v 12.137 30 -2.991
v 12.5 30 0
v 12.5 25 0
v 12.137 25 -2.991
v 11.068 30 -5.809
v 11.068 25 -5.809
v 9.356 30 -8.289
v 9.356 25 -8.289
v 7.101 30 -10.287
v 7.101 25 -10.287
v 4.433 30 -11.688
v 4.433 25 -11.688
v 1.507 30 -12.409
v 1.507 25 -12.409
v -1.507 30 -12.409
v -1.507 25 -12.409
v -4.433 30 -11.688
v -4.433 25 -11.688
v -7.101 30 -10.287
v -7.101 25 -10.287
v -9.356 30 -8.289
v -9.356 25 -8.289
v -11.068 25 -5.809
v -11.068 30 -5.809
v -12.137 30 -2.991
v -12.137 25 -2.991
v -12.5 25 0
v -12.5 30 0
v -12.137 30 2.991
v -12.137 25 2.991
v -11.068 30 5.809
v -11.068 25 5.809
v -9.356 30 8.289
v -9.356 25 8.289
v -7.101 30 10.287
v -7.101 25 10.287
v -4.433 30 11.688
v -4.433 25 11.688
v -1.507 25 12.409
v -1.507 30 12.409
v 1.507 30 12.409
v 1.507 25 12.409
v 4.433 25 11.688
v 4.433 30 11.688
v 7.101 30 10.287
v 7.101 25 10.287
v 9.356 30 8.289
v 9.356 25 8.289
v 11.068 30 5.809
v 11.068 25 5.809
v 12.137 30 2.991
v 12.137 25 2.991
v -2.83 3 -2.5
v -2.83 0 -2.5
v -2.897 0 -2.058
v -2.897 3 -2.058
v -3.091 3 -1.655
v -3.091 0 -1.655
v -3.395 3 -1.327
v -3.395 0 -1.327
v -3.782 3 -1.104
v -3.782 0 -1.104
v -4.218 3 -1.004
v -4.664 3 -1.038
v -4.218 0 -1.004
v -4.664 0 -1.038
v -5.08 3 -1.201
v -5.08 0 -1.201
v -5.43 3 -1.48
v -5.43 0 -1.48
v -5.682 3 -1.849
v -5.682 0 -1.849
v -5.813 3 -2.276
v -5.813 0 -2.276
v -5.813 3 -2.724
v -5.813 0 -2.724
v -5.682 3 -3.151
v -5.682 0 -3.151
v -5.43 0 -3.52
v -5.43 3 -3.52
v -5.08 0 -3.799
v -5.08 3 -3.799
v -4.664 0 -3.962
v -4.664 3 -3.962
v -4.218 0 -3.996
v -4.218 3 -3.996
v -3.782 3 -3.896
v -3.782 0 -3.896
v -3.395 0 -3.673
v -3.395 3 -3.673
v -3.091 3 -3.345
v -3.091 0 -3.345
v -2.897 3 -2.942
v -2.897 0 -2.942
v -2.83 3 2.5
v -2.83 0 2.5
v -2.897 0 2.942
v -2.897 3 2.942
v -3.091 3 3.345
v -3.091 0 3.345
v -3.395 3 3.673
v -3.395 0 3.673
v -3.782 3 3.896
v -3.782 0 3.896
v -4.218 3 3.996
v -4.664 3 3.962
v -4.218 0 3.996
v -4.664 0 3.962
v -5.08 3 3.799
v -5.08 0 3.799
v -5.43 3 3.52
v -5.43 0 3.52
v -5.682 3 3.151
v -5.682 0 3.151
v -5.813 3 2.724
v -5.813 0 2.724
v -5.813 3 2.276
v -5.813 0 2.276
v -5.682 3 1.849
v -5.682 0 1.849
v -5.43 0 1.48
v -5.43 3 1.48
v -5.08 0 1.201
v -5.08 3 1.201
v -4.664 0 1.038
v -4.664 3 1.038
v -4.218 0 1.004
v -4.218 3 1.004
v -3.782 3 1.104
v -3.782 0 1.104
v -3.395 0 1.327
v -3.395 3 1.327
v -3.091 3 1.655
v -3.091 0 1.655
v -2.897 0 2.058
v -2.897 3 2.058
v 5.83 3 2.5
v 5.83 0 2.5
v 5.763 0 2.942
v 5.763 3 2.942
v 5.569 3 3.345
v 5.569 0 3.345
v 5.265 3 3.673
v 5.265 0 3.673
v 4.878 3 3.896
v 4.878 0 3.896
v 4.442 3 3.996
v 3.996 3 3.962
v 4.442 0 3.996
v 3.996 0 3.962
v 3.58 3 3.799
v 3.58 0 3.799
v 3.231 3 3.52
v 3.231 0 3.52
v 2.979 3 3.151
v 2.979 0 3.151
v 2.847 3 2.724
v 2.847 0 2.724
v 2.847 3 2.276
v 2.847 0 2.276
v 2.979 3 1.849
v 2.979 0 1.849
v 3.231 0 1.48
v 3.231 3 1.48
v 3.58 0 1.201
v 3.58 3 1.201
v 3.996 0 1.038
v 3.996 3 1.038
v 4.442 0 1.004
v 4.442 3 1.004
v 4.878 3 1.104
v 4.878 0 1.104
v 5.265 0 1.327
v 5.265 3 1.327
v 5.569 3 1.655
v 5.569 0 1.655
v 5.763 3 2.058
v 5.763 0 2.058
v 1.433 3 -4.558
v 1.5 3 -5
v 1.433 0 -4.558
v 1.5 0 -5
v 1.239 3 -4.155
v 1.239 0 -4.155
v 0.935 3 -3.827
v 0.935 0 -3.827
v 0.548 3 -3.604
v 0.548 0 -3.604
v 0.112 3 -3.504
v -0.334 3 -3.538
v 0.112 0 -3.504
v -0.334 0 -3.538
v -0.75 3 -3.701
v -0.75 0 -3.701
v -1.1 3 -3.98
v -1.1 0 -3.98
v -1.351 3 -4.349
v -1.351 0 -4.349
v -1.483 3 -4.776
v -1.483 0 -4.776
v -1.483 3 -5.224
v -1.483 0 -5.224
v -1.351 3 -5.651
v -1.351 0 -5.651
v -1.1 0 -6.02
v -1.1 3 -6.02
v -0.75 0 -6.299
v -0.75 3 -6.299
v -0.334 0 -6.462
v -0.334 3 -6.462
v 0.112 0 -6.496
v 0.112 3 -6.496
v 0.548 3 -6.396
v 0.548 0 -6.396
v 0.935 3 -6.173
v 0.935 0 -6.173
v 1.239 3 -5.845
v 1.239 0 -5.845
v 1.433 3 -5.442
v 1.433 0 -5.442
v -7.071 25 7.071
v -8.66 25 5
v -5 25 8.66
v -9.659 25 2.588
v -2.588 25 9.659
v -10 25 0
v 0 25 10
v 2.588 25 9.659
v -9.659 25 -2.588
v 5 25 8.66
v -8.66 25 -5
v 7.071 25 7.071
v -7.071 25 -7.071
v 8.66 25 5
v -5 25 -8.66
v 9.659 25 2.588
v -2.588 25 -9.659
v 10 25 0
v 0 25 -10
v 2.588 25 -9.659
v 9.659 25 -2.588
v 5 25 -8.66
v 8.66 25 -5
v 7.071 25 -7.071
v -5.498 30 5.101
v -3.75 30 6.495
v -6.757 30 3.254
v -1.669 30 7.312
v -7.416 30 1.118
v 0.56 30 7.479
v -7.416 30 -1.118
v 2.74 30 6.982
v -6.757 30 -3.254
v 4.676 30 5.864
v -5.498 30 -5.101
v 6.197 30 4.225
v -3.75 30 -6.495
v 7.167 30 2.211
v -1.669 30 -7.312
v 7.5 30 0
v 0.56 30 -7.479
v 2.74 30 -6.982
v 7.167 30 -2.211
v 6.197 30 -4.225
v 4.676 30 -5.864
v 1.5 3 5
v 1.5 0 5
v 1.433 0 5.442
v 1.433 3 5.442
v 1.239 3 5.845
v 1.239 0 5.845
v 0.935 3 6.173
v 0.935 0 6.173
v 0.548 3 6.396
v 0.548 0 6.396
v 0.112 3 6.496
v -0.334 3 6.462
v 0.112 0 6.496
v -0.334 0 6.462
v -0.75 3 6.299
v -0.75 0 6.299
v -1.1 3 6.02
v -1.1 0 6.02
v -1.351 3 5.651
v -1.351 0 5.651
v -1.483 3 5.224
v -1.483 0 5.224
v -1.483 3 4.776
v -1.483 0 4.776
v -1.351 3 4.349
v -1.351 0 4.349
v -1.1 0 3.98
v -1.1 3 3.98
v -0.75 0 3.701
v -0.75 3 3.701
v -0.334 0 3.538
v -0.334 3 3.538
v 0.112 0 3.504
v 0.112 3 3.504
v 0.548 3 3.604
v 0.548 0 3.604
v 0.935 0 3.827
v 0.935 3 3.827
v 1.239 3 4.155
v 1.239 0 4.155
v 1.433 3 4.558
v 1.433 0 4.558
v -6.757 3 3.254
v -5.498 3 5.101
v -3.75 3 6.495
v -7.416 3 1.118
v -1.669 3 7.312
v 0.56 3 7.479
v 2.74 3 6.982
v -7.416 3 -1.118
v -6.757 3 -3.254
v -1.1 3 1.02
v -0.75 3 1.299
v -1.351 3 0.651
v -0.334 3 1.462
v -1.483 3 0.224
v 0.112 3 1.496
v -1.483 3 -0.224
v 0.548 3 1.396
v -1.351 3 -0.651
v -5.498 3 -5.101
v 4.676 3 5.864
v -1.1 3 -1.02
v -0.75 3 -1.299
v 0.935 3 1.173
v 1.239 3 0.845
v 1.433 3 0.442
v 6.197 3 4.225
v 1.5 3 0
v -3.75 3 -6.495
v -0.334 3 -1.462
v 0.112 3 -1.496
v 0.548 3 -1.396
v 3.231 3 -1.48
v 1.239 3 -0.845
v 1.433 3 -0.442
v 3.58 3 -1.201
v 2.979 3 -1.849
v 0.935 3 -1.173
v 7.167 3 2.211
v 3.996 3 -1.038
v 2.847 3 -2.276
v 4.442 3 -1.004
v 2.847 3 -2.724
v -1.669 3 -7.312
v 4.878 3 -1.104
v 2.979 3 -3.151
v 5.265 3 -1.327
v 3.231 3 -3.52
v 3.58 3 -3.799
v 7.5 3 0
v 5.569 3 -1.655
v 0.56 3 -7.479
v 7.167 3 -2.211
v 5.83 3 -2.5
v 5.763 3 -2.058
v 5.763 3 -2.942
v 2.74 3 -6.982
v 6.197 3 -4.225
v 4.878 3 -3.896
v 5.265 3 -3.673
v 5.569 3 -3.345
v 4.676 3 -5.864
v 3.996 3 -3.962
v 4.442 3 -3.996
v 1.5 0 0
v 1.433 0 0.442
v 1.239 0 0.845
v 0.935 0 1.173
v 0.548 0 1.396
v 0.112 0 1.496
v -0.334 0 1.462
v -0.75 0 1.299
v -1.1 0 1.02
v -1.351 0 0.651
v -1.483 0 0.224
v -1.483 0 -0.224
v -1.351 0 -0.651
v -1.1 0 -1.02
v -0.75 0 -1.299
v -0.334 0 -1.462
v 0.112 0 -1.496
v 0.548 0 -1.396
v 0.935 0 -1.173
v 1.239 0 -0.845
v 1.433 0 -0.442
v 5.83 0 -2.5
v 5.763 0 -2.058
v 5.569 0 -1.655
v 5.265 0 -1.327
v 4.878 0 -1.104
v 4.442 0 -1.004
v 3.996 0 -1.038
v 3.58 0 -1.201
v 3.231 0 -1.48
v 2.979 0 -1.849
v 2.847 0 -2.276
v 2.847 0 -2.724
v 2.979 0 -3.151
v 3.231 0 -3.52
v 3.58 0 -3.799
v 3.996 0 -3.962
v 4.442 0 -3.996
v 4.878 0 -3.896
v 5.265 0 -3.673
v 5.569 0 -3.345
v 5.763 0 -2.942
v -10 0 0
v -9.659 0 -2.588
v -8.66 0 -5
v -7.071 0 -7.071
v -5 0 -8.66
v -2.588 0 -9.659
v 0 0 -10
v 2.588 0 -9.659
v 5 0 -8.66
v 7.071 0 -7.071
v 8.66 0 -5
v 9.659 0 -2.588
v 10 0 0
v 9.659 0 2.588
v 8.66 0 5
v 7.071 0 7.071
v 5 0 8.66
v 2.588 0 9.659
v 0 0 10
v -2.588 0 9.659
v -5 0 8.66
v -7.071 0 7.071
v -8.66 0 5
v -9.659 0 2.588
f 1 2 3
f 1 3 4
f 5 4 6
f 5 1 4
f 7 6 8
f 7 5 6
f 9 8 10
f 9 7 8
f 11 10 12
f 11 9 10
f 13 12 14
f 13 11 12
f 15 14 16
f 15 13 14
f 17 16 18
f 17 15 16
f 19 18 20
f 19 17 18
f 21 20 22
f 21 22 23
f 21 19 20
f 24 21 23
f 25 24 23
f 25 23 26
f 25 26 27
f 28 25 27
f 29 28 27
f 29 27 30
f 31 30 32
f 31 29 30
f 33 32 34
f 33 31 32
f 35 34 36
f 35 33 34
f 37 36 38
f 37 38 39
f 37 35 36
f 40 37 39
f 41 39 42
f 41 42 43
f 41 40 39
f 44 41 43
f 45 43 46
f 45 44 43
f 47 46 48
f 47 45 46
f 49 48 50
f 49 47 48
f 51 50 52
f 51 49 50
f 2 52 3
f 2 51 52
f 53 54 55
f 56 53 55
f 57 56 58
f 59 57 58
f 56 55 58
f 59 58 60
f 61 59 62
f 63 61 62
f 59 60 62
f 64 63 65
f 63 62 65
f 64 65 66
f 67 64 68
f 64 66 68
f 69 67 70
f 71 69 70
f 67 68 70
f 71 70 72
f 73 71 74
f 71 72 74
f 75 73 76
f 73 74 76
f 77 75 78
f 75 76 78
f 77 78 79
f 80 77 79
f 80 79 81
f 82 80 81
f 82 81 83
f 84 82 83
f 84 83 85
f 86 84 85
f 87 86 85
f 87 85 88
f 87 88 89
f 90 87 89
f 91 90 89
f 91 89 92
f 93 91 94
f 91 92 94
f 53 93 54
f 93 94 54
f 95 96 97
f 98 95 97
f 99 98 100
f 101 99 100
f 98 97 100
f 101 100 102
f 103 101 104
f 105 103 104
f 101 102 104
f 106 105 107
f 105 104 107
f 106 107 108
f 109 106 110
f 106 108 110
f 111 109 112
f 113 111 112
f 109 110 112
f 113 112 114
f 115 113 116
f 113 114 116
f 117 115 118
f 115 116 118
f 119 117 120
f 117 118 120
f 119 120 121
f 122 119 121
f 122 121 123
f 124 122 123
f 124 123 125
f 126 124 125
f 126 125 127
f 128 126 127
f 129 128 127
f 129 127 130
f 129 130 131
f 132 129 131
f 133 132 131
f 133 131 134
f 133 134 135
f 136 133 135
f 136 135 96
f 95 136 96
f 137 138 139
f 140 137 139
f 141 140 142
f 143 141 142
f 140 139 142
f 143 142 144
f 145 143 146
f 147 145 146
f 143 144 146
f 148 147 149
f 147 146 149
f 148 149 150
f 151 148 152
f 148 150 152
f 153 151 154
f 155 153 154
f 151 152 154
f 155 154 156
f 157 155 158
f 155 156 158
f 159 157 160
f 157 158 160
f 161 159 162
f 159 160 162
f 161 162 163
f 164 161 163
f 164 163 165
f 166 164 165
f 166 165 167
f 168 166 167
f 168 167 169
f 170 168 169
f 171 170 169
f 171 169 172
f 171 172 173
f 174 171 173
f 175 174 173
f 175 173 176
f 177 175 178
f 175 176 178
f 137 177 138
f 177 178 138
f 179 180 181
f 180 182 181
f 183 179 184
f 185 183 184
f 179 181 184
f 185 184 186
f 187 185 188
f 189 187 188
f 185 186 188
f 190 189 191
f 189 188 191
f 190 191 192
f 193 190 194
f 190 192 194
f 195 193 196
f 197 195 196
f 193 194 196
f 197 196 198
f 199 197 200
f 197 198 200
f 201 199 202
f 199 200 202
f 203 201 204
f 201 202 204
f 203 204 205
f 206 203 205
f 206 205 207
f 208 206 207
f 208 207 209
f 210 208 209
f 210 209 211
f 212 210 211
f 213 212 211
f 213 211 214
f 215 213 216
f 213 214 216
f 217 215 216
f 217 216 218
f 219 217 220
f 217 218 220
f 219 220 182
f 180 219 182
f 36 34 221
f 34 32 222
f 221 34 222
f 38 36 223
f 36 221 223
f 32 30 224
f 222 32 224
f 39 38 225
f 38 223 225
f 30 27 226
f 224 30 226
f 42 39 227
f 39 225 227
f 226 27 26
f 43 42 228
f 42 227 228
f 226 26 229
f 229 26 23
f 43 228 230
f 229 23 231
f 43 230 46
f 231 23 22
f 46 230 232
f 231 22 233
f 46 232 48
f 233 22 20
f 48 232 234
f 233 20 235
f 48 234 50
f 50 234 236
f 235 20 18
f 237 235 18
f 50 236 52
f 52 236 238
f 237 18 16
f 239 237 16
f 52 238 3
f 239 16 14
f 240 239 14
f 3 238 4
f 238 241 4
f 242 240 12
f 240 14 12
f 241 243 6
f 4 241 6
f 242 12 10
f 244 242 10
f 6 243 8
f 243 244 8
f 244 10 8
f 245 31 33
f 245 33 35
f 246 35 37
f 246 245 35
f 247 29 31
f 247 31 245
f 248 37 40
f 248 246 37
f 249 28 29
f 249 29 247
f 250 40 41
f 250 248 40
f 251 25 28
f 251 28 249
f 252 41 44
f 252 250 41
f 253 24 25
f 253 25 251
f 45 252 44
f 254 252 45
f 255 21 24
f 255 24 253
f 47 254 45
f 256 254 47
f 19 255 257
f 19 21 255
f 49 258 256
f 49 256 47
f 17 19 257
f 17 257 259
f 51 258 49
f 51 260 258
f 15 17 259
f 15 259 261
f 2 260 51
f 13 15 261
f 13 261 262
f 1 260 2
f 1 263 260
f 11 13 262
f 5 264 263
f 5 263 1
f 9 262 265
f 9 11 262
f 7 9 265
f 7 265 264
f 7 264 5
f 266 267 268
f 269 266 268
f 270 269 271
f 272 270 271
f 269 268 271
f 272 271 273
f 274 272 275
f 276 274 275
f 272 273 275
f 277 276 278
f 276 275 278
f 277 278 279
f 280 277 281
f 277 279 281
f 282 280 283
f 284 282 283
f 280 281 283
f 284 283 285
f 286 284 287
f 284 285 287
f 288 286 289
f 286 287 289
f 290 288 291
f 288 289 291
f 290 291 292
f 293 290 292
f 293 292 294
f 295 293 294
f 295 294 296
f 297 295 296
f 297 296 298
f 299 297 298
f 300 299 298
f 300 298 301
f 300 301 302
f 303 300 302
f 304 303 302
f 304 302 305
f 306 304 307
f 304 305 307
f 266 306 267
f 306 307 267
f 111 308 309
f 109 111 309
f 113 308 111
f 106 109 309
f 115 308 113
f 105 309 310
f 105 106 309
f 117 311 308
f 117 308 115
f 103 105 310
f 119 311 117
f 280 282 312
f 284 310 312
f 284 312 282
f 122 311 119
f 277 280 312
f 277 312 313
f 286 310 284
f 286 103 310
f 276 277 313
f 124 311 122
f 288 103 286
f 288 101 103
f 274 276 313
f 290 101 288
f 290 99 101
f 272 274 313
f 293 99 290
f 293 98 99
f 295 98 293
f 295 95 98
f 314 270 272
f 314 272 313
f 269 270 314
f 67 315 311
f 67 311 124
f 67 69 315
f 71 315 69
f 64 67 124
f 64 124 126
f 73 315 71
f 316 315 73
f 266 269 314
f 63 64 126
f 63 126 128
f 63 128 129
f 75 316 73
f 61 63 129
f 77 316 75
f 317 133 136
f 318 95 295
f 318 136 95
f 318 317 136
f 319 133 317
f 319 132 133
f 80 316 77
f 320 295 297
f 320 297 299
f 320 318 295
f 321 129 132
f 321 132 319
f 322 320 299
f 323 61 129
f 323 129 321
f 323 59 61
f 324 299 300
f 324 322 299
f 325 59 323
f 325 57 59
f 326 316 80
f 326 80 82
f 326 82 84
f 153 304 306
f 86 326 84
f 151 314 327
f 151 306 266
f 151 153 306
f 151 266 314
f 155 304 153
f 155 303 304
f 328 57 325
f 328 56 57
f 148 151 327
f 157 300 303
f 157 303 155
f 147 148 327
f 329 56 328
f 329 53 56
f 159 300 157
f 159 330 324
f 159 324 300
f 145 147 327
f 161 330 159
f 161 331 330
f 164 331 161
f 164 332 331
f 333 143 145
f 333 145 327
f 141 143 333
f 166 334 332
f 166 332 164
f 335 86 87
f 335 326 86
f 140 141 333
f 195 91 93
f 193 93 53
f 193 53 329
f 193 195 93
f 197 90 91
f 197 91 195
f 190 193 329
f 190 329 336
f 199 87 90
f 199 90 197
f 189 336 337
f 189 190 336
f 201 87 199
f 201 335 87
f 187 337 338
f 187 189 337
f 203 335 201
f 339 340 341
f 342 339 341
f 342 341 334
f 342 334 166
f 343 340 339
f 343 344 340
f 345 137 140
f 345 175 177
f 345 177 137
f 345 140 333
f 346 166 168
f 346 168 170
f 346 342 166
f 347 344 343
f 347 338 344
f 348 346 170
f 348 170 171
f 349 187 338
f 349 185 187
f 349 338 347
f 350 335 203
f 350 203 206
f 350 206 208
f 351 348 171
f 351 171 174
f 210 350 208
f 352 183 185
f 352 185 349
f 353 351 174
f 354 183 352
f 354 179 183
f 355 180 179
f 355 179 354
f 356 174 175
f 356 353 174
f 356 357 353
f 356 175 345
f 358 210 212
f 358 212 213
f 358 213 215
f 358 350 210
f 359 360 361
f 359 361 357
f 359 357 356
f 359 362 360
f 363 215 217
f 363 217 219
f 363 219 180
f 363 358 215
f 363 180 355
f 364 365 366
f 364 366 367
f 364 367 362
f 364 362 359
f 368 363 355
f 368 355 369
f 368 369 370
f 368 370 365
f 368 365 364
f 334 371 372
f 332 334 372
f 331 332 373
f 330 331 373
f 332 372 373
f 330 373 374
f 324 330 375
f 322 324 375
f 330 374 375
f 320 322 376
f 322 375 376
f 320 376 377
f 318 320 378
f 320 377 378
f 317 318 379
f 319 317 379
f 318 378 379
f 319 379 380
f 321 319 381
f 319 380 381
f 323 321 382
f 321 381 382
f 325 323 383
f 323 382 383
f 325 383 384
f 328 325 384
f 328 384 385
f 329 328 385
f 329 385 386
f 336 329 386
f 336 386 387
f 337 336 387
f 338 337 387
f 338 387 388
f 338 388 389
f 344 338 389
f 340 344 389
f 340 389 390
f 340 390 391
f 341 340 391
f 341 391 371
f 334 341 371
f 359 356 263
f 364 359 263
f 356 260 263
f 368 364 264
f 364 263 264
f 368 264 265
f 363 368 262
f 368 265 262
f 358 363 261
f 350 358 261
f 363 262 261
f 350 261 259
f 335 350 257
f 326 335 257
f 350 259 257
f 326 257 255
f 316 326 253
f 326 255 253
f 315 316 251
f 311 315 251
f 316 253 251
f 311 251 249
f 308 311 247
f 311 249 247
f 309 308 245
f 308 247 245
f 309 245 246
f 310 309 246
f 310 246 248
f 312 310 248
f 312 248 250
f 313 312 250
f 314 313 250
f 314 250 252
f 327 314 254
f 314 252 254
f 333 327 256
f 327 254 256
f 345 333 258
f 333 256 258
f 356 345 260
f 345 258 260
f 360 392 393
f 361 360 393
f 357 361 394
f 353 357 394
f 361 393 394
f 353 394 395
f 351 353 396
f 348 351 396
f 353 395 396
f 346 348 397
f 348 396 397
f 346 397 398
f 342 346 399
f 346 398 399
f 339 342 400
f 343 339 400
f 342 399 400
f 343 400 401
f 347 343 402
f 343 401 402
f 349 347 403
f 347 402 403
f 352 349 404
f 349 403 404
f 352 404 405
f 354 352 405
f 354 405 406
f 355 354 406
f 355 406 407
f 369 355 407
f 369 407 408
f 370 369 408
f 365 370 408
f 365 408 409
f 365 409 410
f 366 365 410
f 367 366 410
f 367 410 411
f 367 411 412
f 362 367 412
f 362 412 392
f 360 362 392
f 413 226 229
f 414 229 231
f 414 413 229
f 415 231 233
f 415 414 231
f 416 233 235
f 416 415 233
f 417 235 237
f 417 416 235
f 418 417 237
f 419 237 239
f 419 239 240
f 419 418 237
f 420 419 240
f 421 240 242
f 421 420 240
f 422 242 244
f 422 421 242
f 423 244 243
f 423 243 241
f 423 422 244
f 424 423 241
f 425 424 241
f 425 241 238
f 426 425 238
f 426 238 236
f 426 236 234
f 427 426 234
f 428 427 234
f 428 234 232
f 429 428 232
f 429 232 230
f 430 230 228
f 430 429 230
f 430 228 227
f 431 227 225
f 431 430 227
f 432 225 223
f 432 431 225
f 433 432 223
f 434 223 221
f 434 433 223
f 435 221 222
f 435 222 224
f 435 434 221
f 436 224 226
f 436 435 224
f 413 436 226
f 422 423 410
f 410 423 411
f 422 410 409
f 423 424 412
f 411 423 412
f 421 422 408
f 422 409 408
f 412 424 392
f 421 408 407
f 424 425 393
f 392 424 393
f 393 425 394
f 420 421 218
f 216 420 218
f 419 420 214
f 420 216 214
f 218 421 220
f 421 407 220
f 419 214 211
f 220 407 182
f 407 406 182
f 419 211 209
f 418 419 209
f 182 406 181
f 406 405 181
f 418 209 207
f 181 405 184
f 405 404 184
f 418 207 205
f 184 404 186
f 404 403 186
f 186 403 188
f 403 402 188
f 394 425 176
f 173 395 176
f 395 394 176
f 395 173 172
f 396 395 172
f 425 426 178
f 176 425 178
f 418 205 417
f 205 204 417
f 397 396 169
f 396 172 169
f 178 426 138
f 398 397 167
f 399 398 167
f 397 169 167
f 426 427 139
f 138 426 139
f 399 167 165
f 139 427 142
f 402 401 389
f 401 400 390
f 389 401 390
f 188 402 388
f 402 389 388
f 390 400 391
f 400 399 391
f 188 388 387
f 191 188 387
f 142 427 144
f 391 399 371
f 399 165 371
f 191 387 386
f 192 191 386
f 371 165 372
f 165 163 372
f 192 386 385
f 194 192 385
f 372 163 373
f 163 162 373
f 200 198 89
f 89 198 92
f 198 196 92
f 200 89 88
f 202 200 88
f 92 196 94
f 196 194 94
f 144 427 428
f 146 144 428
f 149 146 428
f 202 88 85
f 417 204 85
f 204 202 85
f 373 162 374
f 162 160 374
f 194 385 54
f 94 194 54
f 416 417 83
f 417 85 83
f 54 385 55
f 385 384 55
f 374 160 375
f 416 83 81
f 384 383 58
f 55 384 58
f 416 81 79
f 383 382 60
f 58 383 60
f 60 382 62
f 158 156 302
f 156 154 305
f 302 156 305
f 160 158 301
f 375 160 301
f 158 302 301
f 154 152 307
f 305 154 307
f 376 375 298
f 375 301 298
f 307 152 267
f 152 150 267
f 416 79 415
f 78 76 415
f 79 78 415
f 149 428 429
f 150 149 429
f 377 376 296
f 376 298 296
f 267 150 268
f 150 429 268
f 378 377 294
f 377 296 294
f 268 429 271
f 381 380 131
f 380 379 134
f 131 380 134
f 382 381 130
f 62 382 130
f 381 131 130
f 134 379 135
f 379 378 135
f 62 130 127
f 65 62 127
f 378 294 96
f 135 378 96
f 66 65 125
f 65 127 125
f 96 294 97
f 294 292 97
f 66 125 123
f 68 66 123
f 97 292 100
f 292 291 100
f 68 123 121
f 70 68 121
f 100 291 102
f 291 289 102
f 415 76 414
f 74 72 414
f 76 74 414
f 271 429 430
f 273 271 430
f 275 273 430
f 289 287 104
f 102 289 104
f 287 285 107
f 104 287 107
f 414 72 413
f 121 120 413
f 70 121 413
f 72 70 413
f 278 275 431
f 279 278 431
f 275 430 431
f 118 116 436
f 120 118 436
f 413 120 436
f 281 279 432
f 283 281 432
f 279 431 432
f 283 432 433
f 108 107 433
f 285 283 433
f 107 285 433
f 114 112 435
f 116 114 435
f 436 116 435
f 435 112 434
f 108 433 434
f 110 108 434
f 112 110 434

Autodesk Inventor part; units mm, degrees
ref_plane "YZ Plane" through (0, 0, 0) normal (1, 0, 0) x (0, 1, 0)
ref_plane "XZ Plane" through (0, 0, 0) normal (0, 1, 0) x (-1, 0, 0)
ref_plane "XY Plane" through (0, 0, 0) normal (0, 0, 1) x (1, 0, 0)
sketch "Sketch1" plane through (0, 0, 0) normal (0, 1, 0) x (-1, 0, 0)
  circle A0 centre (0, 0) radius 10
  dimension "d0" = 20
extrude "Extrusion1" add sketch "Sketch1" along normal blind 30
sketch "Sketch2" plane through (0, 30, 0) normal (0, 1, 0) x (1, 0, 0)
  circle A0 centre (0, 0) radius 12.5
  dimension "d3" = 25
extrude "Extrusion2" add sketch "Sketch2" against normal blind 5
sketch "Sketch3" plane through (0, 30, 0) normal (0, 1, 0) x (1, 0, 0)
  circle A0 centre (0, 0) radius 7.5
  dimension "d7" = 15
extrude "Extrusion3" cut sketch "Sketch3" against normal blind 27
sketch "Sketch5" plane through (0, 0, 0) normal (0, -1, 0) x (1, 0, 0)
  circle A0 centre (0, 0) radius 5 construction
  circle A1 centre (0, 5) radius 1.5
  circle A2 centre (0, 0) radius 5 construction
  circle A3 centre (-4.3301, 2.5) radius 1.5
  circle A4 centre (0, 0) radius 5 construction
  circle A5 centre (-4.3301, -2.5) radius 1.5
  circle A6 centre (0, 0) radius 5 construction
  circle A7 centre (0, -5) radius 1.5
  circle A8 centre (0, 0) radius 5 construction
  circle A9 centre (4.3301, -2.5) radius 1.5
  circle A10 centre (0, 0) radius 5 construction
  circle A11 centre (4.3301, 2.5) radius 1.5
  circle A12 centre (0, 0) radius 1.5
  dimension "d32" = 10
  dimension "d33" = 3
  dimension "d36" = 360
  dimension "d38" = 3
extrude "Extrusion6" cut sketch "Sketch5" against normal blind 10
sketch "Sketch6" plane through (0, 30, 0) normal (0, 1, 0) x (1, 0, 0)
  point P0 (0, 0)
properties part number "DiffusionModule" material "ABS Plastic"
